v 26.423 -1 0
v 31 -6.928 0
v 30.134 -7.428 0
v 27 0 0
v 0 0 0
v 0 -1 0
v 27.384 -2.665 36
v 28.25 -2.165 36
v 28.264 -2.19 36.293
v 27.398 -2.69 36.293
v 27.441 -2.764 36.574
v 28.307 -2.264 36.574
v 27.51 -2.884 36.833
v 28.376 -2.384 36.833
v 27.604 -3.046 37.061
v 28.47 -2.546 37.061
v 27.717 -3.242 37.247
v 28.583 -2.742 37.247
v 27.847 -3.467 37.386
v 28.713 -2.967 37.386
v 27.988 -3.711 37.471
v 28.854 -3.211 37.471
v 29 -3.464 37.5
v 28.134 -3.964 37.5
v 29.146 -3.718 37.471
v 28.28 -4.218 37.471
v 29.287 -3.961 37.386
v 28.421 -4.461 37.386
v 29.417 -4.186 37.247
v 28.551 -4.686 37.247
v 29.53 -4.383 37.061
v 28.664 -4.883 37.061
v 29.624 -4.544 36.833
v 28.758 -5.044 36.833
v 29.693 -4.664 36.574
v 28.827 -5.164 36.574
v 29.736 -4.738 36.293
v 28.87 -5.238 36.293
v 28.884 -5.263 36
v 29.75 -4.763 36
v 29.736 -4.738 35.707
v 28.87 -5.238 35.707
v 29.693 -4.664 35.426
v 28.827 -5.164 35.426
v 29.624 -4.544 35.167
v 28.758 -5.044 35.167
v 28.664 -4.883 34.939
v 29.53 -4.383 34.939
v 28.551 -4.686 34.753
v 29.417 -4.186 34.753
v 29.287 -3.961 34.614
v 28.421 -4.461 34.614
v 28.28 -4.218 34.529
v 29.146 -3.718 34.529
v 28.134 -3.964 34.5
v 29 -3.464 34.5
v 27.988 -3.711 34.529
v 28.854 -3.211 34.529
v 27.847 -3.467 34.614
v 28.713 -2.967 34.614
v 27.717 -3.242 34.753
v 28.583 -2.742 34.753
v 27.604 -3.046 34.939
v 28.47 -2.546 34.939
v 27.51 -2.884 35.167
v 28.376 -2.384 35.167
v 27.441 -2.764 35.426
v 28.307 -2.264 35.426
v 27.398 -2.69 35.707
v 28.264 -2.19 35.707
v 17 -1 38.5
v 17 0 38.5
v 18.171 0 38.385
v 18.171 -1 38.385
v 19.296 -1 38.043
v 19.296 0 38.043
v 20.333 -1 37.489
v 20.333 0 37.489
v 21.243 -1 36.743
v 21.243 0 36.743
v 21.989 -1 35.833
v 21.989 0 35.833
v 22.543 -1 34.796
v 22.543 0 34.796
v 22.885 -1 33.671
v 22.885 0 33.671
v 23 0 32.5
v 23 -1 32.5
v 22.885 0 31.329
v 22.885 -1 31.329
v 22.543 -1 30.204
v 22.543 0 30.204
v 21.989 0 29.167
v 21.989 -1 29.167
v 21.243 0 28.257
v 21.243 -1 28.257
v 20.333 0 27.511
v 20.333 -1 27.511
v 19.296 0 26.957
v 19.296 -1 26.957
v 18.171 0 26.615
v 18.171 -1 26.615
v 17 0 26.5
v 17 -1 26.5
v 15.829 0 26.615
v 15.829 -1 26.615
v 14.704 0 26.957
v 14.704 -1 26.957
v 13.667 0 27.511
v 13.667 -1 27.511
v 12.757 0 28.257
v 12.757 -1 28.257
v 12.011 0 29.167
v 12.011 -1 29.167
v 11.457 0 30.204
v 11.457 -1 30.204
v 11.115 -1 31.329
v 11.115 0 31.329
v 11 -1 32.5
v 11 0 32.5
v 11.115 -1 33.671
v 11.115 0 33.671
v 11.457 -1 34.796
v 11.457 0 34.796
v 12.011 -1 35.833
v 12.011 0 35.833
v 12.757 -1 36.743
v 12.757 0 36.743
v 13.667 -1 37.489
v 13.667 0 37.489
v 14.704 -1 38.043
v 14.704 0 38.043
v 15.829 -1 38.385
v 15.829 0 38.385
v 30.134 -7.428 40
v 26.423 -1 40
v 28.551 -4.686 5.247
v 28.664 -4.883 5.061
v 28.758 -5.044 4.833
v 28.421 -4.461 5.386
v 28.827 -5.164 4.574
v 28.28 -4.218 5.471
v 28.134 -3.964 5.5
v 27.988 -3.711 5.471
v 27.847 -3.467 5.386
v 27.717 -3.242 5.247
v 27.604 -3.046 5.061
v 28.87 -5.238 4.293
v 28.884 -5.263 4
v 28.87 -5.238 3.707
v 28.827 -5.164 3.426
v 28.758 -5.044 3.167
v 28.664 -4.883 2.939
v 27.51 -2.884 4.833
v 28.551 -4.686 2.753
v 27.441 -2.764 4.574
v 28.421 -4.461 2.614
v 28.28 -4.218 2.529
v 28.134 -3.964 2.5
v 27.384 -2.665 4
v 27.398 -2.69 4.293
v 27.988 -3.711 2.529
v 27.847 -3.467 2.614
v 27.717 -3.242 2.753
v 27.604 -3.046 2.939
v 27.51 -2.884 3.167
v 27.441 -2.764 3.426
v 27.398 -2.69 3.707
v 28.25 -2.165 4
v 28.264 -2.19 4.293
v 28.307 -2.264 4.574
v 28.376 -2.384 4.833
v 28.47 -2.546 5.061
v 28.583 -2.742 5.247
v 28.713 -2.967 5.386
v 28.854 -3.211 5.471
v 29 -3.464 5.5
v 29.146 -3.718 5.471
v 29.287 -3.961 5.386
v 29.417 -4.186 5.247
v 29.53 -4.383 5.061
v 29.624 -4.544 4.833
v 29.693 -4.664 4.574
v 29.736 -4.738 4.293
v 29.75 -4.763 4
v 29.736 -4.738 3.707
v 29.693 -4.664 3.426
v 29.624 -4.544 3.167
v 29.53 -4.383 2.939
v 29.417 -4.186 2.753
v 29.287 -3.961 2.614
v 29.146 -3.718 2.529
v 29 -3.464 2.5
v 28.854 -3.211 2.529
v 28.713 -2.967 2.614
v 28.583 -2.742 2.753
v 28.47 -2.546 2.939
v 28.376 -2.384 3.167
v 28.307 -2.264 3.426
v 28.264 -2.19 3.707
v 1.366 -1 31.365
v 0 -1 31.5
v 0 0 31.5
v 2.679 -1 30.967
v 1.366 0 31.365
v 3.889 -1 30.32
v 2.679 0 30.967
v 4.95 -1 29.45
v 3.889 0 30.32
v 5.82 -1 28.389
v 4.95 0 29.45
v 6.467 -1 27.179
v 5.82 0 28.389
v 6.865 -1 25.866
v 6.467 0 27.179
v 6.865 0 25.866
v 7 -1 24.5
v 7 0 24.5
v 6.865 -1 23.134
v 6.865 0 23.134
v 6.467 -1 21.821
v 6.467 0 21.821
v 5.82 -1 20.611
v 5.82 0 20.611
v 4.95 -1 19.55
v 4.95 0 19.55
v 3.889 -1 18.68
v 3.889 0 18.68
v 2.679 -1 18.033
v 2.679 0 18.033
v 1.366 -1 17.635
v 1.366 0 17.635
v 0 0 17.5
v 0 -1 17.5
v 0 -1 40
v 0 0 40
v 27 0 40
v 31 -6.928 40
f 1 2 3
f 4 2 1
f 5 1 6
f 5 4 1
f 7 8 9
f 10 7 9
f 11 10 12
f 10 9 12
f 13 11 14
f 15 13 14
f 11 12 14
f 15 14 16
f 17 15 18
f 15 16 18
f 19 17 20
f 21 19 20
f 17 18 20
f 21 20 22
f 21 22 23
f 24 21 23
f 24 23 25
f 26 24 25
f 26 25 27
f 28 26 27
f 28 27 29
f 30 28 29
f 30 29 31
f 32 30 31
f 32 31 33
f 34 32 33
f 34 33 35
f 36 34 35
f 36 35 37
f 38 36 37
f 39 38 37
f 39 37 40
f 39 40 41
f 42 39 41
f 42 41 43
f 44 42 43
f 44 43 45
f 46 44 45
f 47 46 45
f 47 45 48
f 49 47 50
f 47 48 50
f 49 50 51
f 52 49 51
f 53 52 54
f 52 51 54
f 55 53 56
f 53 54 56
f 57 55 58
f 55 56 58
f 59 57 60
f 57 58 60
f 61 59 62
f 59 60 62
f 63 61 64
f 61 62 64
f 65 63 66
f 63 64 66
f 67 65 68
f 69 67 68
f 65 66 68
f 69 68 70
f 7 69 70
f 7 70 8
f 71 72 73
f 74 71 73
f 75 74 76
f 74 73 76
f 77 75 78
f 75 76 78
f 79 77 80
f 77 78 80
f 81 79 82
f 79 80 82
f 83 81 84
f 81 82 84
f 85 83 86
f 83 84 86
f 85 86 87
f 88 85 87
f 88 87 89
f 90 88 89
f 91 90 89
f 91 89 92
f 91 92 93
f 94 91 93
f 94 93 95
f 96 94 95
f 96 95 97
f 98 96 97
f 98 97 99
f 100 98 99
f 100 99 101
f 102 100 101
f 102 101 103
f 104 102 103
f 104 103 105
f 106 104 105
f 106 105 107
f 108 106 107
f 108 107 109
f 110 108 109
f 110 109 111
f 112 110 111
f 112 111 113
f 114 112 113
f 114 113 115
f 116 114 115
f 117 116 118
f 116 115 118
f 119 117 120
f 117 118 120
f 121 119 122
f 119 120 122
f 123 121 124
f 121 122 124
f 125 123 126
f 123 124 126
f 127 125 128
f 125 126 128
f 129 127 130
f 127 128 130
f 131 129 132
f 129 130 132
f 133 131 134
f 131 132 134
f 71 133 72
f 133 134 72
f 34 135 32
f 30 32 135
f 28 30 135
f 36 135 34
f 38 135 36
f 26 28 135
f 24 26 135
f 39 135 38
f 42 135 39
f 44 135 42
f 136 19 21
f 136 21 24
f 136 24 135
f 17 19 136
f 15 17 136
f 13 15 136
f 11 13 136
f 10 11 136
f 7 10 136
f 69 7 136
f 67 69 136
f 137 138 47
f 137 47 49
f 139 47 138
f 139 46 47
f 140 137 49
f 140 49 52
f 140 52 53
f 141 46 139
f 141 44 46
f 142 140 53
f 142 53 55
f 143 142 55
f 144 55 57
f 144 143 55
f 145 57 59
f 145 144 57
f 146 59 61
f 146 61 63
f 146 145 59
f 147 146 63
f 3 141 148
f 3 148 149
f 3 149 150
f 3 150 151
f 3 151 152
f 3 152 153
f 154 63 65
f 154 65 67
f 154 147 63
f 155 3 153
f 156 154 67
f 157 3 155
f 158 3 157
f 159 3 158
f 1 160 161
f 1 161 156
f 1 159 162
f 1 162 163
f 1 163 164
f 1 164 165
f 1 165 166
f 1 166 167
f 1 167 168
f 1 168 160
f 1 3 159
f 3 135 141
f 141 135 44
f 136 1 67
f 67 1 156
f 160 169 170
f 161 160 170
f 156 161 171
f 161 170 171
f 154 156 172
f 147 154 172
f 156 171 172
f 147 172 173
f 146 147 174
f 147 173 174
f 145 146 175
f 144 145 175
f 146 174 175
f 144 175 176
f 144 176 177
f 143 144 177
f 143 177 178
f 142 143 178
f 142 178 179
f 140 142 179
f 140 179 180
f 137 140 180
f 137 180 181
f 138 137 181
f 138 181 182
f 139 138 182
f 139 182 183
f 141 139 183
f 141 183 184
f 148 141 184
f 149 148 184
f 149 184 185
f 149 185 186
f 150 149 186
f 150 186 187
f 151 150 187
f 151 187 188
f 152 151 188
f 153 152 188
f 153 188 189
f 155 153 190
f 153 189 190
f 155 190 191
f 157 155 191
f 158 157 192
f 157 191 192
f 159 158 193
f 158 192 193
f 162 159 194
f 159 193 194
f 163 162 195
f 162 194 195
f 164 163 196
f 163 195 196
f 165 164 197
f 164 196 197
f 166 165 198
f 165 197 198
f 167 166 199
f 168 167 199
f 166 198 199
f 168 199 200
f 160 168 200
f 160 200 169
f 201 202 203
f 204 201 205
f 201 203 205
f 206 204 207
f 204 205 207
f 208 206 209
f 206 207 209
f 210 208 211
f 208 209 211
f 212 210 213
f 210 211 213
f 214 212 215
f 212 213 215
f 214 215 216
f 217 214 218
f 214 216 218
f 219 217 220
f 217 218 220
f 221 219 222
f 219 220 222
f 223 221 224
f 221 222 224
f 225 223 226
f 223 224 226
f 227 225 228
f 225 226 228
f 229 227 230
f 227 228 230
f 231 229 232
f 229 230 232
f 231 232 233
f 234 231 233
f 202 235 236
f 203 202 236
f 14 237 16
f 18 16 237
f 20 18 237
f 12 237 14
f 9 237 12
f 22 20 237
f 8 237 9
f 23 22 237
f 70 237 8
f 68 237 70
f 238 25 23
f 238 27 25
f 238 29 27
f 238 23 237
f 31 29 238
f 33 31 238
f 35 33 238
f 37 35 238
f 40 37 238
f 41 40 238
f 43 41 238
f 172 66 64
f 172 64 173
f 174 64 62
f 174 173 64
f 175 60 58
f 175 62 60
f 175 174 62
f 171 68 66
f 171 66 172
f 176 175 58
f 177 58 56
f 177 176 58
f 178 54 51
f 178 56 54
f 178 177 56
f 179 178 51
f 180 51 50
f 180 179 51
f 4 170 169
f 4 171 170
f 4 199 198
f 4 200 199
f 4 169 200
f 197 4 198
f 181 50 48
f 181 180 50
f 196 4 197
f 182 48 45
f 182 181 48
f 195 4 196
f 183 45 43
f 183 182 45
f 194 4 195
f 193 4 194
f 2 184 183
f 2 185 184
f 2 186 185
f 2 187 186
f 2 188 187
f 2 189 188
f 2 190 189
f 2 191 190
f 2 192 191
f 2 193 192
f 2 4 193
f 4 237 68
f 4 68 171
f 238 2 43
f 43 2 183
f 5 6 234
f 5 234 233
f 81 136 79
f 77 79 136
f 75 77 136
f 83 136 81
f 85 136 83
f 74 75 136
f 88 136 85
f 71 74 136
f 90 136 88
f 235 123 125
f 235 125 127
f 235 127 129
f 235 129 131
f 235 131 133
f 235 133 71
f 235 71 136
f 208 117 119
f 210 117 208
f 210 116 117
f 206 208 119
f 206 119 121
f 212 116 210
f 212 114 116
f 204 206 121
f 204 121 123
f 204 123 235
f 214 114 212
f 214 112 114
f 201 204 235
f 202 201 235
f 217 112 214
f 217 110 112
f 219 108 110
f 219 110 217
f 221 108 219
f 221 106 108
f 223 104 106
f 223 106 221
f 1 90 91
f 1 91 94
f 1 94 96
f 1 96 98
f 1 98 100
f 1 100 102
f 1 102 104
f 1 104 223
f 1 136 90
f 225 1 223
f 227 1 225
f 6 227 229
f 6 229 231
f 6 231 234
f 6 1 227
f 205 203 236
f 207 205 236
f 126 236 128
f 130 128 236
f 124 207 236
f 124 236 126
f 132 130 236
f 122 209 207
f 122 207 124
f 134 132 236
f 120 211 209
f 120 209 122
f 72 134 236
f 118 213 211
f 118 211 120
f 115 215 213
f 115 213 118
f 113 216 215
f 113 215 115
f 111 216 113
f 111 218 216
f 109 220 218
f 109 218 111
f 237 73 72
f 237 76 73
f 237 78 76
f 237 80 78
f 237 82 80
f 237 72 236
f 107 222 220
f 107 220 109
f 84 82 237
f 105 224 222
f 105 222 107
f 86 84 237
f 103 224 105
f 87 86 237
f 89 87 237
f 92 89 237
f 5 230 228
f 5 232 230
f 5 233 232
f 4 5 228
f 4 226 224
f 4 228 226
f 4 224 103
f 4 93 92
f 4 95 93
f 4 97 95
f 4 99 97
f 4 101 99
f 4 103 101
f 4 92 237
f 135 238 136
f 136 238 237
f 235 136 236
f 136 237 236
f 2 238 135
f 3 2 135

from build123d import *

# Parameters (mm, degrees)
BOSS_EXTRUDE1_DEPTH = 40
SKETCH2_R           = 1.5
CUT_EXTRUDE1_DEPTH  = 40
SKETCH3_R           = 7
SKETCH3_R_2         = 6
CUT_EXTRUDE2_DEPTH  = 40


with BuildPart() as part:
    # Sketch1 → Boss-Extrude1 (new body)
    with BuildSketch(Plane.XY):
        Polygon((0, 0), (27, 0), (31, -6.92820323), (30.133974596, -7.42820323), (26.422649731, -1), (0, -1), align=None)
    extrude(amount=BOSS_EXTRUDE1_DEPTH)

    # Sketch2 → Cut-Extrude1 (cut)
    with BuildSketch(Plane(origin=(20.25, 11.691342951, 0), x_dir=(0, 0, -1), z_dir=(0.86602540378444, 0.4999999999999978, 0))):
        with Locations(Location((-36, -17.5, 0), (0, 0, 90))):
            Circle(SKETCH2_R)
        with Locations(Location((-4, -17.5, 0), (0, 0, 90))):
            Circle(SKETCH2_R)
    extrude(amount=-CUT_EXTRUDE1_DEPTH, mode=Mode.SUBTRACT)

    # Sketch3 → Cut-Extrude2 (cut)
    with BuildSketch(Plane(origin=(0, 0, 0), x_dir=(-1, 0, 0), z_dir=(0, 1, 0))):
        with Locations((0, 24.5)):
            Circle(SKETCH3_R)
        with Locations(Location((-17, 32.5, 0), (0, 0, 90))):
            Circle(SKETCH3_R_2)
    extrude(amount=-CUT_EXTRUDE2_DEPTH, mode=Mode.SUBTRACT)


solid = part.part
